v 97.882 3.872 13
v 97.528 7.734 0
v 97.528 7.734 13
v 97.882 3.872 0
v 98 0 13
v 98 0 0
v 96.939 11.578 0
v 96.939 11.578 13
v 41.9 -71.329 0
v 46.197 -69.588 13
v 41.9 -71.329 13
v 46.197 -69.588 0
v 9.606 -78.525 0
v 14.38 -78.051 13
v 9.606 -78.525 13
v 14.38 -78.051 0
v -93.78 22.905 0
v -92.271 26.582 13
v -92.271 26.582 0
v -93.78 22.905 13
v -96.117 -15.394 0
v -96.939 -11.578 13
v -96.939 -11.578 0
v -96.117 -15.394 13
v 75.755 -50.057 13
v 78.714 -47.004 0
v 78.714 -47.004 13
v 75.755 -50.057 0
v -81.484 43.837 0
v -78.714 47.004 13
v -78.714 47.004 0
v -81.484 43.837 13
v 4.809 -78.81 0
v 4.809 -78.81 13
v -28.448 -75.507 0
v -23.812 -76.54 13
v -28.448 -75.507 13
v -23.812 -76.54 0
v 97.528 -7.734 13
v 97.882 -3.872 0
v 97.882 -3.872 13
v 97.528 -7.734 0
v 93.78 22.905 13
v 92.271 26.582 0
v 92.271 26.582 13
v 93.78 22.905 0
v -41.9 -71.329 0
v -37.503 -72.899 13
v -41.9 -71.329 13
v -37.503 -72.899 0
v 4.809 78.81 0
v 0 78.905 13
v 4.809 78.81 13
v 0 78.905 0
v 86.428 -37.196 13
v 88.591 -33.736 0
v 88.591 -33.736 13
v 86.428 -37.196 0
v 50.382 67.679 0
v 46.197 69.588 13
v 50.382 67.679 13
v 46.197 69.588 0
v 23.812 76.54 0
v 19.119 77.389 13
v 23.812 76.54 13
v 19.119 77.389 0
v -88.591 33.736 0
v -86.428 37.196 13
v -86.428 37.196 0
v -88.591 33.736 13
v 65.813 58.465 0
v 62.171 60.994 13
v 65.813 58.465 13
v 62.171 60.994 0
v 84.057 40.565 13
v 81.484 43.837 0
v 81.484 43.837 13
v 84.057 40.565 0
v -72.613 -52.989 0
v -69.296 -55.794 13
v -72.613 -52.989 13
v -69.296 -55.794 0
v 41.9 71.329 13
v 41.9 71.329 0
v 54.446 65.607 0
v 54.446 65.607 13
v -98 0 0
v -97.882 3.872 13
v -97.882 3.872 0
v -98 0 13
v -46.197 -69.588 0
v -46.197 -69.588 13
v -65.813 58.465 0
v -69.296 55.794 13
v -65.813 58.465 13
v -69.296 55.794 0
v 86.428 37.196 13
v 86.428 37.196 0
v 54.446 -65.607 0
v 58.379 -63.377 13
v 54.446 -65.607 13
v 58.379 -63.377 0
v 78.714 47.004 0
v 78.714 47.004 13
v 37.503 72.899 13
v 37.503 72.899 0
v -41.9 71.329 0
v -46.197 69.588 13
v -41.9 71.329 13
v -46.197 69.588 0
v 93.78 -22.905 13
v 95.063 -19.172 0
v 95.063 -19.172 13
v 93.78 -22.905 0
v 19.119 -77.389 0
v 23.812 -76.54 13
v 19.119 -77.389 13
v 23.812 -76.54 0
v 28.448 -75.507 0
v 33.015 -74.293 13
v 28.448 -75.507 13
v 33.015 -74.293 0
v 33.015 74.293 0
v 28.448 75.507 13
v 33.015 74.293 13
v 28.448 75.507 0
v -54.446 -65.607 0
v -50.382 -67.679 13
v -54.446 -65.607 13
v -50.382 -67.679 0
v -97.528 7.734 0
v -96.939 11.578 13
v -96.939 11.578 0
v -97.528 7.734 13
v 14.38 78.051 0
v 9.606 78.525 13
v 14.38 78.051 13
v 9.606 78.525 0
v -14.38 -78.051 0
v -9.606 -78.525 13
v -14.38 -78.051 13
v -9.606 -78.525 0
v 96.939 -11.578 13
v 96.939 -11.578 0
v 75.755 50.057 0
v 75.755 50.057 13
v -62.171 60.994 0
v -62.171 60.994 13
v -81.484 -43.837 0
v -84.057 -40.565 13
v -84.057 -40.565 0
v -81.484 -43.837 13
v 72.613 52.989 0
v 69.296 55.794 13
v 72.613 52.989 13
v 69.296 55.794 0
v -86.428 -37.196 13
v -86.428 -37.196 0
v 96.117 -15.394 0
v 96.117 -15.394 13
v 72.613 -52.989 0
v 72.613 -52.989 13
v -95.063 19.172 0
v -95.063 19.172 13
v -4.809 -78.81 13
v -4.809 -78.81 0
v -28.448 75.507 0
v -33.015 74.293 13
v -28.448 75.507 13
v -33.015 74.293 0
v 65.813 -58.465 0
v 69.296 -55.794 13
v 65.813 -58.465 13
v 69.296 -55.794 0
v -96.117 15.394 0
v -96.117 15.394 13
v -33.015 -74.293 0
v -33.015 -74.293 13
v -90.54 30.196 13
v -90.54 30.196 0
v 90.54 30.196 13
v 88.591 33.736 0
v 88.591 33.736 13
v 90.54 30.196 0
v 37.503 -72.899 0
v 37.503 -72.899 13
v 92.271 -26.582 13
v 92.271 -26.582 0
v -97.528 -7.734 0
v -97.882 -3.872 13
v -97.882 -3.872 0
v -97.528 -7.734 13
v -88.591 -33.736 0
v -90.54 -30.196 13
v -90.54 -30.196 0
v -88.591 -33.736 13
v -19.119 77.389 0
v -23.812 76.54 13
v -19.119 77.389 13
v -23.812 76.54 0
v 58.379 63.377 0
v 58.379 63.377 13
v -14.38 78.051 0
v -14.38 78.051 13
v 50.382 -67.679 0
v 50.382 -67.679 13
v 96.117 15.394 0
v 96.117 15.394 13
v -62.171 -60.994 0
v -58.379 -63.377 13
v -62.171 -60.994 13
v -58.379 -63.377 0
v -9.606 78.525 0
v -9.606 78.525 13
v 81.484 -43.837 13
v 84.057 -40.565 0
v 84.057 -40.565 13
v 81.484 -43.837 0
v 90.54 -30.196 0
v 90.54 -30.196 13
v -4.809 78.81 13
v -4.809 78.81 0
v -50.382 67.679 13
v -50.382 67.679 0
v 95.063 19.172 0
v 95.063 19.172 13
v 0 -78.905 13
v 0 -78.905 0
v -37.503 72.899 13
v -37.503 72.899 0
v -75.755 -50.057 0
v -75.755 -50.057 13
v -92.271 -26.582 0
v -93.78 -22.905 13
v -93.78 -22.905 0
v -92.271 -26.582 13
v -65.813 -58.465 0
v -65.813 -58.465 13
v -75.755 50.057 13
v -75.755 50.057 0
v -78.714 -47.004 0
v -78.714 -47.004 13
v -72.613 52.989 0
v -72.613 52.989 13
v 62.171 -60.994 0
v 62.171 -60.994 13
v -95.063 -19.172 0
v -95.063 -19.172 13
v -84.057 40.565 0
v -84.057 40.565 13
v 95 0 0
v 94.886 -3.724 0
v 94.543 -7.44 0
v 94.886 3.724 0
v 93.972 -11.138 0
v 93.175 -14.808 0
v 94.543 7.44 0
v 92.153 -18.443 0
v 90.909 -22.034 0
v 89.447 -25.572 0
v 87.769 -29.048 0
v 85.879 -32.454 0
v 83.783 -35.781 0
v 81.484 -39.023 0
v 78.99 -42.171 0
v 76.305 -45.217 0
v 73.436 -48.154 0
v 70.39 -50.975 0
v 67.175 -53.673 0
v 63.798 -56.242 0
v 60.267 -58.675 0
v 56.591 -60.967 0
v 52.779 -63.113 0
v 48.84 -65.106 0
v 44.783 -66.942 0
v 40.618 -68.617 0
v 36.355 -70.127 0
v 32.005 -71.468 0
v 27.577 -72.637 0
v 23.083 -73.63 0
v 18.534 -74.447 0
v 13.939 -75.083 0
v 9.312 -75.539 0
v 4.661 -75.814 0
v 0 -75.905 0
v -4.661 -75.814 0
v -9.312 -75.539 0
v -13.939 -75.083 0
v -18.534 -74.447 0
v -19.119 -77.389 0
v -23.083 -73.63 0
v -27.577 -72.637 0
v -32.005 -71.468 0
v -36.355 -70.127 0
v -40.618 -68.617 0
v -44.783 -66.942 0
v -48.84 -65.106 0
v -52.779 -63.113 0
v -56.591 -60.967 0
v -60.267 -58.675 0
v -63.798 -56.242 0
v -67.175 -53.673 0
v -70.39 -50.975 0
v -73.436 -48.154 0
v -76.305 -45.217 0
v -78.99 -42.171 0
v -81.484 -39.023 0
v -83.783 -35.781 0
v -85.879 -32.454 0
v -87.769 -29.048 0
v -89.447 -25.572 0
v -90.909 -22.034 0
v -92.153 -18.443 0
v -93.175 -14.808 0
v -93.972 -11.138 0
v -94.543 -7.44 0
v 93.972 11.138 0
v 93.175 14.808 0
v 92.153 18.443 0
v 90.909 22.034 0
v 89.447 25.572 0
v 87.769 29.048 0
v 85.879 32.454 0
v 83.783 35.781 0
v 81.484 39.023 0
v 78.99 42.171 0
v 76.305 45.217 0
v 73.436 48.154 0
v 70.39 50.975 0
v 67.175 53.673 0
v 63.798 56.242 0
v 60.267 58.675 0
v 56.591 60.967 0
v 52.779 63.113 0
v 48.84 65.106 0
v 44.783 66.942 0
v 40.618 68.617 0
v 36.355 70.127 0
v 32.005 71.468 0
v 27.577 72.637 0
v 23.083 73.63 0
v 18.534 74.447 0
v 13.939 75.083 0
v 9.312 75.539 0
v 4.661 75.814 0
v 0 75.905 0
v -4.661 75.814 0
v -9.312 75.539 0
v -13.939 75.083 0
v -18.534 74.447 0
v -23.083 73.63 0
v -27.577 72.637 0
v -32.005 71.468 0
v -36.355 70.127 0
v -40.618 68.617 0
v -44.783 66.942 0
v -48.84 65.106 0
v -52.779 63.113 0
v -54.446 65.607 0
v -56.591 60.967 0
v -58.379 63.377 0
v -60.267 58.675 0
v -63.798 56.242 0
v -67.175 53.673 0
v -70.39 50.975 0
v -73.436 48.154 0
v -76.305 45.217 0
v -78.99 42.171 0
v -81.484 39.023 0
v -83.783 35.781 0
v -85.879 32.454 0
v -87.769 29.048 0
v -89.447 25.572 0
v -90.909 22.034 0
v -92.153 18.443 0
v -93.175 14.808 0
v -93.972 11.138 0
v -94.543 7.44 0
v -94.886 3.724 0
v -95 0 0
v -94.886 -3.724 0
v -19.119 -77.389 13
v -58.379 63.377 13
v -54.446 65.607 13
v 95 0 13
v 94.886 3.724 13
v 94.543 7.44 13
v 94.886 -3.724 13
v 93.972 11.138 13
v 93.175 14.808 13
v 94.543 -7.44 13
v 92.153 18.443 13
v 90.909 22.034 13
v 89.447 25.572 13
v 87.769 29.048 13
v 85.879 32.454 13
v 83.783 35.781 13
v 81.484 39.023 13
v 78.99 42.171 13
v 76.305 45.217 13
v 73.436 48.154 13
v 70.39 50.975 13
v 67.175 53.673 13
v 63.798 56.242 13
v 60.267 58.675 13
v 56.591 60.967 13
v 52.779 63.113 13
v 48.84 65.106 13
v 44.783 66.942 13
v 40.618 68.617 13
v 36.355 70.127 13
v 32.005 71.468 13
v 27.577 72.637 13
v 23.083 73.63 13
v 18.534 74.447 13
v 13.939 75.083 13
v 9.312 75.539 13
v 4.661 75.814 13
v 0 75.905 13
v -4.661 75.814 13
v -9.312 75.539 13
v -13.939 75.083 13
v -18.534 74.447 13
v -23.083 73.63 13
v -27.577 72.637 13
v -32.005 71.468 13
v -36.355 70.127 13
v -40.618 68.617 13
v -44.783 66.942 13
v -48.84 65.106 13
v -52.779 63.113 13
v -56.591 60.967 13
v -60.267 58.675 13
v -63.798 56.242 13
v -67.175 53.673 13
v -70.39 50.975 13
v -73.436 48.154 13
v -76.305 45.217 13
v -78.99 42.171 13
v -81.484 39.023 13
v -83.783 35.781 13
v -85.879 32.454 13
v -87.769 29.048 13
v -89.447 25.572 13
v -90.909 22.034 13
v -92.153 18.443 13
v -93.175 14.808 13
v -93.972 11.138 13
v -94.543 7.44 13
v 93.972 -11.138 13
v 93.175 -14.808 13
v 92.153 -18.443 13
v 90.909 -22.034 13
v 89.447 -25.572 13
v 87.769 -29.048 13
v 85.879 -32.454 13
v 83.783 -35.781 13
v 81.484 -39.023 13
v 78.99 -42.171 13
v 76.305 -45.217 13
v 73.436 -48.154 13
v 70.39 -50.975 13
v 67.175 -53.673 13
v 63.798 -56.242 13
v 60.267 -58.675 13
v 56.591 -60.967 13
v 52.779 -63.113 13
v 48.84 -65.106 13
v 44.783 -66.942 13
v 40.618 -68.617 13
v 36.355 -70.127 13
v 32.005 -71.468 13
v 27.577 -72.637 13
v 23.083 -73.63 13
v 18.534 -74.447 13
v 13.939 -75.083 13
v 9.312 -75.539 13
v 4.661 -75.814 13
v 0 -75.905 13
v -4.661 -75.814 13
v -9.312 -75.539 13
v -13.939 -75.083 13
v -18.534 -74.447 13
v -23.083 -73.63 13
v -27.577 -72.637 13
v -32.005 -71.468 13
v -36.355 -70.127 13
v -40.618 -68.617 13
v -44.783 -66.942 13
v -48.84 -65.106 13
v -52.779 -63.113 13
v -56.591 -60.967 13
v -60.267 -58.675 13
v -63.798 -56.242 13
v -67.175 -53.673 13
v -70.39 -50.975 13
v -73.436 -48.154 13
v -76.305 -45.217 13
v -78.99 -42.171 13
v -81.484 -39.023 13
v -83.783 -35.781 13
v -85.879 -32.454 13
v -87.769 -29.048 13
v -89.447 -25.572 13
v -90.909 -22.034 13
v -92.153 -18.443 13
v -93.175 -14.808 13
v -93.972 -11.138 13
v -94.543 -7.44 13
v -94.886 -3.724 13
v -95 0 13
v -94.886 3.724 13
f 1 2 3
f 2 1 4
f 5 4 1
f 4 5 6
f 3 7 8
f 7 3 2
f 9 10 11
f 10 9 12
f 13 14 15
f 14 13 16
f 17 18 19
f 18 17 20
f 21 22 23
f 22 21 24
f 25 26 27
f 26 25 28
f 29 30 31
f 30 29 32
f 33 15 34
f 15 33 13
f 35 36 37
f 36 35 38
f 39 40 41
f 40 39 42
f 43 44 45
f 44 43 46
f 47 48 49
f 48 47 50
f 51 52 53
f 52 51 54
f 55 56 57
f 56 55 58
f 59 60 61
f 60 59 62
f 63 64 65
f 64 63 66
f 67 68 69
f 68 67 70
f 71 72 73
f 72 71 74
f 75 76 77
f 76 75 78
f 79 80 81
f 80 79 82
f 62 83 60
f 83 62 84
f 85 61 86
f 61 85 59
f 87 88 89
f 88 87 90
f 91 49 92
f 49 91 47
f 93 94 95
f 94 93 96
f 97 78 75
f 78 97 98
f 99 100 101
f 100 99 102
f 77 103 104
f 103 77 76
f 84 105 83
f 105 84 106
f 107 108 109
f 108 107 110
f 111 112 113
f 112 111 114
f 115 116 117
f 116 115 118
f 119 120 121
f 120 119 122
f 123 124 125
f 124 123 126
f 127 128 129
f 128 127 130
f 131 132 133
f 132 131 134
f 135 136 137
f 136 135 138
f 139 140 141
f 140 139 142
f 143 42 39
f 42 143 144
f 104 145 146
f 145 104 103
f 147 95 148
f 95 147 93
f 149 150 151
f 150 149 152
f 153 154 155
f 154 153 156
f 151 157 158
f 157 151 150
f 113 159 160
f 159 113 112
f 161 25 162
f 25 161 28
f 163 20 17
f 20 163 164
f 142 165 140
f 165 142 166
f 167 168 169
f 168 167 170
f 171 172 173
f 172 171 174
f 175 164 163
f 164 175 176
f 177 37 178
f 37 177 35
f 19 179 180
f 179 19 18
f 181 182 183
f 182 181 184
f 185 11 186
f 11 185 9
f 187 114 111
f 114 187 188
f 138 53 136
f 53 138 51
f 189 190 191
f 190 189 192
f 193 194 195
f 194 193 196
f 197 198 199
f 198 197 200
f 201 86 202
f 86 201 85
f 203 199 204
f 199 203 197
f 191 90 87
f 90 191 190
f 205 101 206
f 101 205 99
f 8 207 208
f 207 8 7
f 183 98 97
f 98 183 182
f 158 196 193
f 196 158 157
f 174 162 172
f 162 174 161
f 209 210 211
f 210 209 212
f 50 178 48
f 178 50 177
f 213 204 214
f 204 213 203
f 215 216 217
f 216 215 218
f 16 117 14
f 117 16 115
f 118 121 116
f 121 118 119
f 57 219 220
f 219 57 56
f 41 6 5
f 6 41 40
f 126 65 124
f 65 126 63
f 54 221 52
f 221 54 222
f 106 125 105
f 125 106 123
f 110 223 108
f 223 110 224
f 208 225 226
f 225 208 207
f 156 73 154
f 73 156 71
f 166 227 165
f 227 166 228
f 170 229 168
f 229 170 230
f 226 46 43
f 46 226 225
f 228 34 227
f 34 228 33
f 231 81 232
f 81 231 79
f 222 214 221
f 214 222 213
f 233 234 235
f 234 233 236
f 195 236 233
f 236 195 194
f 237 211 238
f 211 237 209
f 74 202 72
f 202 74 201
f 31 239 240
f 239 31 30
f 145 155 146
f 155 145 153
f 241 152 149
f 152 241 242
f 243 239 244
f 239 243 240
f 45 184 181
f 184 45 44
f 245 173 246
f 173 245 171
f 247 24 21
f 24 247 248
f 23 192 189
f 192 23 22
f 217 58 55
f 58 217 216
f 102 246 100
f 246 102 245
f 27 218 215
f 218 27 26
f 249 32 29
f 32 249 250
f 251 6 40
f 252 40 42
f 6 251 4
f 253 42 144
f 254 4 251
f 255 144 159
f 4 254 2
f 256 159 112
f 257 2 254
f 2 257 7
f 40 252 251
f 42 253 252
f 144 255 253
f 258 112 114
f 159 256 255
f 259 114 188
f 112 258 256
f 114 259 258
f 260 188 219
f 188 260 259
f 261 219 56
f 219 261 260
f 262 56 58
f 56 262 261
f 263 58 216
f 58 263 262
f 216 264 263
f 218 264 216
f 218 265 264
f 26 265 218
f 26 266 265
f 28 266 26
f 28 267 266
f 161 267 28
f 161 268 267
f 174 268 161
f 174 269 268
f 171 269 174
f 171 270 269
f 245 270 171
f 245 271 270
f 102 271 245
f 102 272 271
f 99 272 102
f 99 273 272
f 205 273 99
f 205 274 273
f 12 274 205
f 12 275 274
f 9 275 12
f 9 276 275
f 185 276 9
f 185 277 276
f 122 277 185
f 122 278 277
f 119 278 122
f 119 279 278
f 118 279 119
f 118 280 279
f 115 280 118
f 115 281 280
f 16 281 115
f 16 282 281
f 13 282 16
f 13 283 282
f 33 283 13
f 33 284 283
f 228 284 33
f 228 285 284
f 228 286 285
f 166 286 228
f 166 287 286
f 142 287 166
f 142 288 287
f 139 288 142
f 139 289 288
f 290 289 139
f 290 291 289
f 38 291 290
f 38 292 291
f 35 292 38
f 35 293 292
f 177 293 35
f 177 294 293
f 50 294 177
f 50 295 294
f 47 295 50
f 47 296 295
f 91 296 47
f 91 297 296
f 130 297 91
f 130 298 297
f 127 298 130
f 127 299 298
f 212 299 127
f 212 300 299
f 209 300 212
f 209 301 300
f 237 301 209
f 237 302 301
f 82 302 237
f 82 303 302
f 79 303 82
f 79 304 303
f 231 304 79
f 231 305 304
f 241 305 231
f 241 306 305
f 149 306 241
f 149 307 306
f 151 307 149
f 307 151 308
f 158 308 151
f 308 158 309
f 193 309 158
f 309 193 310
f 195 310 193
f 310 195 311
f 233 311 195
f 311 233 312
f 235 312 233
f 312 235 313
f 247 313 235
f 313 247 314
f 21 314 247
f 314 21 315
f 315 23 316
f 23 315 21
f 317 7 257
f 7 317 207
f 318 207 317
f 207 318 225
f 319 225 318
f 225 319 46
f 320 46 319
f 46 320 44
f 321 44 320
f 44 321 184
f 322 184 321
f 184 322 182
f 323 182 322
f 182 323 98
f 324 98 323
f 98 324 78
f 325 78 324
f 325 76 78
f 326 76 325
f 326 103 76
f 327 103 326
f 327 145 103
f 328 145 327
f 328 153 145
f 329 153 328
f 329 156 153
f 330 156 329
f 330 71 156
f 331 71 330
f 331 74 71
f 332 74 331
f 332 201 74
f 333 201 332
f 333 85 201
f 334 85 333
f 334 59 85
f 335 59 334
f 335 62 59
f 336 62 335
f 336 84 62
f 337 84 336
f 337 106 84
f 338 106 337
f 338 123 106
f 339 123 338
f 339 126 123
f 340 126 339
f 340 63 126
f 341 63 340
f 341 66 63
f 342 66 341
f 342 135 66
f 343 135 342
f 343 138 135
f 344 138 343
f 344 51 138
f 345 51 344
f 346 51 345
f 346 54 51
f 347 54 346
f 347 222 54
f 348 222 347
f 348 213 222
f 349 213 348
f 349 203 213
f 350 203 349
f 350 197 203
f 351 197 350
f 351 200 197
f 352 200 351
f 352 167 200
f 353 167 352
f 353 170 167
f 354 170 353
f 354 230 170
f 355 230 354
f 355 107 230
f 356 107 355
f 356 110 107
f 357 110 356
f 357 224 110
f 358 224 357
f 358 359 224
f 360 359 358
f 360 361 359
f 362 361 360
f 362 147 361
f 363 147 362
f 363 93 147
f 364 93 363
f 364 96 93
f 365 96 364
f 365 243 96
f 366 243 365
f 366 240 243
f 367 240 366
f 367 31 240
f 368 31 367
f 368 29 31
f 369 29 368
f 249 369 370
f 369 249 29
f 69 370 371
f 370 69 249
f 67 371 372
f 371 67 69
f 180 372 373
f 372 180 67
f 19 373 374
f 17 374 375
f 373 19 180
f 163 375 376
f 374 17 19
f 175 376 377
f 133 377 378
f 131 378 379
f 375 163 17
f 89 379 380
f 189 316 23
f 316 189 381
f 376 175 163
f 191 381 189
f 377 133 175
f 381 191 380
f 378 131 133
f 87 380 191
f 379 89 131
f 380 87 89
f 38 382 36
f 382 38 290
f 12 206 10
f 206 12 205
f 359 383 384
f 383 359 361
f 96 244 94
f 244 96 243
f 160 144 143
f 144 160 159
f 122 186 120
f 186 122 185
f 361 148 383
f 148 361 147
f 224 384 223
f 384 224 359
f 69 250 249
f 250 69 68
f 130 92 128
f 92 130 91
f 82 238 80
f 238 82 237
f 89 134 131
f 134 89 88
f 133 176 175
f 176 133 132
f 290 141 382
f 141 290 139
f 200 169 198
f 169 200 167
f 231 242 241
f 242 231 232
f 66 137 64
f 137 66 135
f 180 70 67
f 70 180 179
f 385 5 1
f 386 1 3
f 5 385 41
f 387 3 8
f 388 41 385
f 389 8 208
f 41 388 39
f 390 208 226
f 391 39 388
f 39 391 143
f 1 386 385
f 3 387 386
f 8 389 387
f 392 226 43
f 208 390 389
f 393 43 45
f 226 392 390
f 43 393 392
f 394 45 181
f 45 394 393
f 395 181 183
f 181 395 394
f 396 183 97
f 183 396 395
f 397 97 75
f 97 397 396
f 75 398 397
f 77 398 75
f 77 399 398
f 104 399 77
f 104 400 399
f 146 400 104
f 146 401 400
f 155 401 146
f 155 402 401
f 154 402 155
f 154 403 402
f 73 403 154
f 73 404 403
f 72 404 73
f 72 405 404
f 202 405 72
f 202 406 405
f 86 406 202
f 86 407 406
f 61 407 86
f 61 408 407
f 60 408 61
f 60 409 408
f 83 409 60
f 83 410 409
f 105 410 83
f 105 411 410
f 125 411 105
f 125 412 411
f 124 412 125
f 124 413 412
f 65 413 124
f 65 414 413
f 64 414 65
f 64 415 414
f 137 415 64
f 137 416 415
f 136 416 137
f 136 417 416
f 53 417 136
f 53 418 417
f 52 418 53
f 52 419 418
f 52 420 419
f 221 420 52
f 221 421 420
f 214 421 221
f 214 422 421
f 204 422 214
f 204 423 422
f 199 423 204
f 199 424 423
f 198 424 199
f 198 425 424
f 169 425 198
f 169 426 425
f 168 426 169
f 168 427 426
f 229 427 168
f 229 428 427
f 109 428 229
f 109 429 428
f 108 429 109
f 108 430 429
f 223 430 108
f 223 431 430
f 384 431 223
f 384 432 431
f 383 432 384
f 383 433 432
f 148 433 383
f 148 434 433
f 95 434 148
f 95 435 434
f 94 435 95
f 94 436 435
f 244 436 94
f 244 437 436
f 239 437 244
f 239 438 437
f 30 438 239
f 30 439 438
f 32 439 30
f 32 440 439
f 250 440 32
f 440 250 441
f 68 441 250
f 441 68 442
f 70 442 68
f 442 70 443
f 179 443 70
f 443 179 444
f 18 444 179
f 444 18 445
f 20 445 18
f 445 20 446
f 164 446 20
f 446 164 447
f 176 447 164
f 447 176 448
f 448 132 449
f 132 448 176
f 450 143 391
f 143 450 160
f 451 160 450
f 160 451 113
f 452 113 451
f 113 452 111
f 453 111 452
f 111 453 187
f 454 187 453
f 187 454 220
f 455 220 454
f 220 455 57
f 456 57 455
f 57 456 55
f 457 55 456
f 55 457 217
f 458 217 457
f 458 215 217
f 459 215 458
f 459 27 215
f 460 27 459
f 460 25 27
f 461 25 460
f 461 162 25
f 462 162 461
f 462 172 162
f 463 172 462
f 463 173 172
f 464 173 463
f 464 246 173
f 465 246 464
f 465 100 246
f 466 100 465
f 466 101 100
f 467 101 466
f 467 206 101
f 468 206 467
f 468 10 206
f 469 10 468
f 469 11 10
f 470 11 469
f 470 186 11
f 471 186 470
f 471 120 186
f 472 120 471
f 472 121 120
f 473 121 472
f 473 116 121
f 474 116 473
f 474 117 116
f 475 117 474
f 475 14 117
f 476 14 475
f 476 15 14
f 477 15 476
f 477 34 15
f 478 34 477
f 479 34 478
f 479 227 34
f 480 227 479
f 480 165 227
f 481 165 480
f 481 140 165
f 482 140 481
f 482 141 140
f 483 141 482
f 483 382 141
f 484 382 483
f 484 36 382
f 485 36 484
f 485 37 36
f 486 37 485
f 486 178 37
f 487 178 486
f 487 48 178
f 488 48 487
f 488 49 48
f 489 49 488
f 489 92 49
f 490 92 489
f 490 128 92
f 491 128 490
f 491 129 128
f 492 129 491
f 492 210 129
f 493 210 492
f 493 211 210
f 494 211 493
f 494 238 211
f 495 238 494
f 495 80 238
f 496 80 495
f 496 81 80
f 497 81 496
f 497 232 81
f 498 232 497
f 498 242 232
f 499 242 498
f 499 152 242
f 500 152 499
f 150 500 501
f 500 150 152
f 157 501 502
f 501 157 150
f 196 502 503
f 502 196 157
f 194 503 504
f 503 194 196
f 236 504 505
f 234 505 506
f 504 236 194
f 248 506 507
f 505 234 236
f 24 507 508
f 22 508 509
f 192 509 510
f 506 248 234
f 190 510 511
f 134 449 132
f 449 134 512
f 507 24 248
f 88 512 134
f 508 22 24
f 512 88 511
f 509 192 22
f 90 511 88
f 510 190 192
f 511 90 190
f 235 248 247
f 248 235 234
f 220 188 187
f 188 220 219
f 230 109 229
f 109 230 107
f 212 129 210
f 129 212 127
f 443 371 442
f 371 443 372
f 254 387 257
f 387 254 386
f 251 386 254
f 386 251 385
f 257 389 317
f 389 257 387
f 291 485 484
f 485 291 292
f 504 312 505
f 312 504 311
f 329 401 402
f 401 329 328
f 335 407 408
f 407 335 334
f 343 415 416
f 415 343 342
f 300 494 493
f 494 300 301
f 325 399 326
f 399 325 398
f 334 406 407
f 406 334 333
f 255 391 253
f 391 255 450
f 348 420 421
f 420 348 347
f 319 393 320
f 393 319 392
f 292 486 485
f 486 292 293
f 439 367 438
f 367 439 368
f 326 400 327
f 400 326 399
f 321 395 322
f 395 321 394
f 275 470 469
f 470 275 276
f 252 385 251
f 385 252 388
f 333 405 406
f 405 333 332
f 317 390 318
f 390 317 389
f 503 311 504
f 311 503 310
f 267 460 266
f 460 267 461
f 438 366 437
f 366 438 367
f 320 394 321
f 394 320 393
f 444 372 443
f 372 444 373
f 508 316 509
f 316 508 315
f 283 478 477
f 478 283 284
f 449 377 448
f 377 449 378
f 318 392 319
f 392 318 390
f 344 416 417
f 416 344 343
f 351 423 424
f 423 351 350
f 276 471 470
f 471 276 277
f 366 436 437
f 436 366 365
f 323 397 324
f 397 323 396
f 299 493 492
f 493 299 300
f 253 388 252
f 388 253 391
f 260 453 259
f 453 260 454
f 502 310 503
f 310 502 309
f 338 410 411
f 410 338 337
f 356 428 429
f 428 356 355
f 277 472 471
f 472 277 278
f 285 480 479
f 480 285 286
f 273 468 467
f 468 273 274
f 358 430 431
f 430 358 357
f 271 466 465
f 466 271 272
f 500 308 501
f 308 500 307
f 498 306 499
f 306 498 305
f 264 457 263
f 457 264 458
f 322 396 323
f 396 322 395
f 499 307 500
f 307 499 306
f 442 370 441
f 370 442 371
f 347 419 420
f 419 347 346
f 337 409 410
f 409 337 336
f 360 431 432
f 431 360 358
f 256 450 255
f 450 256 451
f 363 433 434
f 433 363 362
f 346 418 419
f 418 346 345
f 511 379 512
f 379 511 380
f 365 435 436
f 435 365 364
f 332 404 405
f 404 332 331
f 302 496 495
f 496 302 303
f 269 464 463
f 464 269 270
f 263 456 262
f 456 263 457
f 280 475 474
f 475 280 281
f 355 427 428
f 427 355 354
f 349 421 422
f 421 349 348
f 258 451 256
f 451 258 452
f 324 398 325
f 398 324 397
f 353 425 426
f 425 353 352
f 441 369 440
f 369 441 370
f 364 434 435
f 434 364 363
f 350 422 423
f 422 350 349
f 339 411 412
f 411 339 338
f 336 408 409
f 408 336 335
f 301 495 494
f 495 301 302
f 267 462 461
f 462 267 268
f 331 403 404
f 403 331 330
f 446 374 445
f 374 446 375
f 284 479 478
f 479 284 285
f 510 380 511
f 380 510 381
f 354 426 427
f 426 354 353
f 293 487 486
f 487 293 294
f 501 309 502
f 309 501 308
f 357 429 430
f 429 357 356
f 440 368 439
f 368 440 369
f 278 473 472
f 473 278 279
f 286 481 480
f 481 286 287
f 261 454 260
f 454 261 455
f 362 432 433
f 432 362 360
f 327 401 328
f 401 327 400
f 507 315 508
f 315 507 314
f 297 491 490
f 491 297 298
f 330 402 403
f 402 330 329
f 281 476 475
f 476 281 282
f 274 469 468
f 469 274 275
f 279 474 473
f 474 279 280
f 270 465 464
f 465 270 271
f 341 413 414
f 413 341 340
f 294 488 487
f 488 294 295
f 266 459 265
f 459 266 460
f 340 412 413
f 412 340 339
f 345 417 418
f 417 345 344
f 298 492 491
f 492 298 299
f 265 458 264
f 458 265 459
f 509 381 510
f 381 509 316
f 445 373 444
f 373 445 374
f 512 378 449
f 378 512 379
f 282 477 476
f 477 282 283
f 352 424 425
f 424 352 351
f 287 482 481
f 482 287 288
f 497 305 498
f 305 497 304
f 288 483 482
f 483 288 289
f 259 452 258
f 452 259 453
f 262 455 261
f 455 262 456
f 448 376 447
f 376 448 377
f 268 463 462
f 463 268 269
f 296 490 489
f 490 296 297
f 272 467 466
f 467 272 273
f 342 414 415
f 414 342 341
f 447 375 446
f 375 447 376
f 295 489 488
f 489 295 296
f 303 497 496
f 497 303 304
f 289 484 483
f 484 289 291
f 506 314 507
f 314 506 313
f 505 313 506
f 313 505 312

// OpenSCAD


BaseWidth=152*1;
BaseLength=190*1;


//Measure your head in mm with a sewing tape measure
HeadCircumference_mm = 540; //[450:750]
//13mm is a average size
BandHeight_mm=13;//[3:20]
//3mm thick is still flexible
BandThickness_mm=3;//[1:8]
//Determines number of sides / facets... more is smoother
$fn=128;

CircPercent = HeadCircumference_mm/540;
CalcLength = BaseLength*CircPercent/2;
CalcWidth = CalcLength*0.799;
echo(CalcLength);
echo(CalcWidth);

//Define an Oval (shape of band)
module oval(w,h, height, center = false) {
 scale([1, h/w, 1]) cylinder(h=height, r=w, center=center); 
};
//Create the Band, with hole in back for rear ornament

    difference() {oval (CalcLength+BandThickness_mm,CalcWidth+BandThickness_mm,BandHeight_mm,center=false,center=false);
translate ([0,0,-1]) oval (CalcLength,CalcWidth,BandHeight_mm+2,center=false);}

